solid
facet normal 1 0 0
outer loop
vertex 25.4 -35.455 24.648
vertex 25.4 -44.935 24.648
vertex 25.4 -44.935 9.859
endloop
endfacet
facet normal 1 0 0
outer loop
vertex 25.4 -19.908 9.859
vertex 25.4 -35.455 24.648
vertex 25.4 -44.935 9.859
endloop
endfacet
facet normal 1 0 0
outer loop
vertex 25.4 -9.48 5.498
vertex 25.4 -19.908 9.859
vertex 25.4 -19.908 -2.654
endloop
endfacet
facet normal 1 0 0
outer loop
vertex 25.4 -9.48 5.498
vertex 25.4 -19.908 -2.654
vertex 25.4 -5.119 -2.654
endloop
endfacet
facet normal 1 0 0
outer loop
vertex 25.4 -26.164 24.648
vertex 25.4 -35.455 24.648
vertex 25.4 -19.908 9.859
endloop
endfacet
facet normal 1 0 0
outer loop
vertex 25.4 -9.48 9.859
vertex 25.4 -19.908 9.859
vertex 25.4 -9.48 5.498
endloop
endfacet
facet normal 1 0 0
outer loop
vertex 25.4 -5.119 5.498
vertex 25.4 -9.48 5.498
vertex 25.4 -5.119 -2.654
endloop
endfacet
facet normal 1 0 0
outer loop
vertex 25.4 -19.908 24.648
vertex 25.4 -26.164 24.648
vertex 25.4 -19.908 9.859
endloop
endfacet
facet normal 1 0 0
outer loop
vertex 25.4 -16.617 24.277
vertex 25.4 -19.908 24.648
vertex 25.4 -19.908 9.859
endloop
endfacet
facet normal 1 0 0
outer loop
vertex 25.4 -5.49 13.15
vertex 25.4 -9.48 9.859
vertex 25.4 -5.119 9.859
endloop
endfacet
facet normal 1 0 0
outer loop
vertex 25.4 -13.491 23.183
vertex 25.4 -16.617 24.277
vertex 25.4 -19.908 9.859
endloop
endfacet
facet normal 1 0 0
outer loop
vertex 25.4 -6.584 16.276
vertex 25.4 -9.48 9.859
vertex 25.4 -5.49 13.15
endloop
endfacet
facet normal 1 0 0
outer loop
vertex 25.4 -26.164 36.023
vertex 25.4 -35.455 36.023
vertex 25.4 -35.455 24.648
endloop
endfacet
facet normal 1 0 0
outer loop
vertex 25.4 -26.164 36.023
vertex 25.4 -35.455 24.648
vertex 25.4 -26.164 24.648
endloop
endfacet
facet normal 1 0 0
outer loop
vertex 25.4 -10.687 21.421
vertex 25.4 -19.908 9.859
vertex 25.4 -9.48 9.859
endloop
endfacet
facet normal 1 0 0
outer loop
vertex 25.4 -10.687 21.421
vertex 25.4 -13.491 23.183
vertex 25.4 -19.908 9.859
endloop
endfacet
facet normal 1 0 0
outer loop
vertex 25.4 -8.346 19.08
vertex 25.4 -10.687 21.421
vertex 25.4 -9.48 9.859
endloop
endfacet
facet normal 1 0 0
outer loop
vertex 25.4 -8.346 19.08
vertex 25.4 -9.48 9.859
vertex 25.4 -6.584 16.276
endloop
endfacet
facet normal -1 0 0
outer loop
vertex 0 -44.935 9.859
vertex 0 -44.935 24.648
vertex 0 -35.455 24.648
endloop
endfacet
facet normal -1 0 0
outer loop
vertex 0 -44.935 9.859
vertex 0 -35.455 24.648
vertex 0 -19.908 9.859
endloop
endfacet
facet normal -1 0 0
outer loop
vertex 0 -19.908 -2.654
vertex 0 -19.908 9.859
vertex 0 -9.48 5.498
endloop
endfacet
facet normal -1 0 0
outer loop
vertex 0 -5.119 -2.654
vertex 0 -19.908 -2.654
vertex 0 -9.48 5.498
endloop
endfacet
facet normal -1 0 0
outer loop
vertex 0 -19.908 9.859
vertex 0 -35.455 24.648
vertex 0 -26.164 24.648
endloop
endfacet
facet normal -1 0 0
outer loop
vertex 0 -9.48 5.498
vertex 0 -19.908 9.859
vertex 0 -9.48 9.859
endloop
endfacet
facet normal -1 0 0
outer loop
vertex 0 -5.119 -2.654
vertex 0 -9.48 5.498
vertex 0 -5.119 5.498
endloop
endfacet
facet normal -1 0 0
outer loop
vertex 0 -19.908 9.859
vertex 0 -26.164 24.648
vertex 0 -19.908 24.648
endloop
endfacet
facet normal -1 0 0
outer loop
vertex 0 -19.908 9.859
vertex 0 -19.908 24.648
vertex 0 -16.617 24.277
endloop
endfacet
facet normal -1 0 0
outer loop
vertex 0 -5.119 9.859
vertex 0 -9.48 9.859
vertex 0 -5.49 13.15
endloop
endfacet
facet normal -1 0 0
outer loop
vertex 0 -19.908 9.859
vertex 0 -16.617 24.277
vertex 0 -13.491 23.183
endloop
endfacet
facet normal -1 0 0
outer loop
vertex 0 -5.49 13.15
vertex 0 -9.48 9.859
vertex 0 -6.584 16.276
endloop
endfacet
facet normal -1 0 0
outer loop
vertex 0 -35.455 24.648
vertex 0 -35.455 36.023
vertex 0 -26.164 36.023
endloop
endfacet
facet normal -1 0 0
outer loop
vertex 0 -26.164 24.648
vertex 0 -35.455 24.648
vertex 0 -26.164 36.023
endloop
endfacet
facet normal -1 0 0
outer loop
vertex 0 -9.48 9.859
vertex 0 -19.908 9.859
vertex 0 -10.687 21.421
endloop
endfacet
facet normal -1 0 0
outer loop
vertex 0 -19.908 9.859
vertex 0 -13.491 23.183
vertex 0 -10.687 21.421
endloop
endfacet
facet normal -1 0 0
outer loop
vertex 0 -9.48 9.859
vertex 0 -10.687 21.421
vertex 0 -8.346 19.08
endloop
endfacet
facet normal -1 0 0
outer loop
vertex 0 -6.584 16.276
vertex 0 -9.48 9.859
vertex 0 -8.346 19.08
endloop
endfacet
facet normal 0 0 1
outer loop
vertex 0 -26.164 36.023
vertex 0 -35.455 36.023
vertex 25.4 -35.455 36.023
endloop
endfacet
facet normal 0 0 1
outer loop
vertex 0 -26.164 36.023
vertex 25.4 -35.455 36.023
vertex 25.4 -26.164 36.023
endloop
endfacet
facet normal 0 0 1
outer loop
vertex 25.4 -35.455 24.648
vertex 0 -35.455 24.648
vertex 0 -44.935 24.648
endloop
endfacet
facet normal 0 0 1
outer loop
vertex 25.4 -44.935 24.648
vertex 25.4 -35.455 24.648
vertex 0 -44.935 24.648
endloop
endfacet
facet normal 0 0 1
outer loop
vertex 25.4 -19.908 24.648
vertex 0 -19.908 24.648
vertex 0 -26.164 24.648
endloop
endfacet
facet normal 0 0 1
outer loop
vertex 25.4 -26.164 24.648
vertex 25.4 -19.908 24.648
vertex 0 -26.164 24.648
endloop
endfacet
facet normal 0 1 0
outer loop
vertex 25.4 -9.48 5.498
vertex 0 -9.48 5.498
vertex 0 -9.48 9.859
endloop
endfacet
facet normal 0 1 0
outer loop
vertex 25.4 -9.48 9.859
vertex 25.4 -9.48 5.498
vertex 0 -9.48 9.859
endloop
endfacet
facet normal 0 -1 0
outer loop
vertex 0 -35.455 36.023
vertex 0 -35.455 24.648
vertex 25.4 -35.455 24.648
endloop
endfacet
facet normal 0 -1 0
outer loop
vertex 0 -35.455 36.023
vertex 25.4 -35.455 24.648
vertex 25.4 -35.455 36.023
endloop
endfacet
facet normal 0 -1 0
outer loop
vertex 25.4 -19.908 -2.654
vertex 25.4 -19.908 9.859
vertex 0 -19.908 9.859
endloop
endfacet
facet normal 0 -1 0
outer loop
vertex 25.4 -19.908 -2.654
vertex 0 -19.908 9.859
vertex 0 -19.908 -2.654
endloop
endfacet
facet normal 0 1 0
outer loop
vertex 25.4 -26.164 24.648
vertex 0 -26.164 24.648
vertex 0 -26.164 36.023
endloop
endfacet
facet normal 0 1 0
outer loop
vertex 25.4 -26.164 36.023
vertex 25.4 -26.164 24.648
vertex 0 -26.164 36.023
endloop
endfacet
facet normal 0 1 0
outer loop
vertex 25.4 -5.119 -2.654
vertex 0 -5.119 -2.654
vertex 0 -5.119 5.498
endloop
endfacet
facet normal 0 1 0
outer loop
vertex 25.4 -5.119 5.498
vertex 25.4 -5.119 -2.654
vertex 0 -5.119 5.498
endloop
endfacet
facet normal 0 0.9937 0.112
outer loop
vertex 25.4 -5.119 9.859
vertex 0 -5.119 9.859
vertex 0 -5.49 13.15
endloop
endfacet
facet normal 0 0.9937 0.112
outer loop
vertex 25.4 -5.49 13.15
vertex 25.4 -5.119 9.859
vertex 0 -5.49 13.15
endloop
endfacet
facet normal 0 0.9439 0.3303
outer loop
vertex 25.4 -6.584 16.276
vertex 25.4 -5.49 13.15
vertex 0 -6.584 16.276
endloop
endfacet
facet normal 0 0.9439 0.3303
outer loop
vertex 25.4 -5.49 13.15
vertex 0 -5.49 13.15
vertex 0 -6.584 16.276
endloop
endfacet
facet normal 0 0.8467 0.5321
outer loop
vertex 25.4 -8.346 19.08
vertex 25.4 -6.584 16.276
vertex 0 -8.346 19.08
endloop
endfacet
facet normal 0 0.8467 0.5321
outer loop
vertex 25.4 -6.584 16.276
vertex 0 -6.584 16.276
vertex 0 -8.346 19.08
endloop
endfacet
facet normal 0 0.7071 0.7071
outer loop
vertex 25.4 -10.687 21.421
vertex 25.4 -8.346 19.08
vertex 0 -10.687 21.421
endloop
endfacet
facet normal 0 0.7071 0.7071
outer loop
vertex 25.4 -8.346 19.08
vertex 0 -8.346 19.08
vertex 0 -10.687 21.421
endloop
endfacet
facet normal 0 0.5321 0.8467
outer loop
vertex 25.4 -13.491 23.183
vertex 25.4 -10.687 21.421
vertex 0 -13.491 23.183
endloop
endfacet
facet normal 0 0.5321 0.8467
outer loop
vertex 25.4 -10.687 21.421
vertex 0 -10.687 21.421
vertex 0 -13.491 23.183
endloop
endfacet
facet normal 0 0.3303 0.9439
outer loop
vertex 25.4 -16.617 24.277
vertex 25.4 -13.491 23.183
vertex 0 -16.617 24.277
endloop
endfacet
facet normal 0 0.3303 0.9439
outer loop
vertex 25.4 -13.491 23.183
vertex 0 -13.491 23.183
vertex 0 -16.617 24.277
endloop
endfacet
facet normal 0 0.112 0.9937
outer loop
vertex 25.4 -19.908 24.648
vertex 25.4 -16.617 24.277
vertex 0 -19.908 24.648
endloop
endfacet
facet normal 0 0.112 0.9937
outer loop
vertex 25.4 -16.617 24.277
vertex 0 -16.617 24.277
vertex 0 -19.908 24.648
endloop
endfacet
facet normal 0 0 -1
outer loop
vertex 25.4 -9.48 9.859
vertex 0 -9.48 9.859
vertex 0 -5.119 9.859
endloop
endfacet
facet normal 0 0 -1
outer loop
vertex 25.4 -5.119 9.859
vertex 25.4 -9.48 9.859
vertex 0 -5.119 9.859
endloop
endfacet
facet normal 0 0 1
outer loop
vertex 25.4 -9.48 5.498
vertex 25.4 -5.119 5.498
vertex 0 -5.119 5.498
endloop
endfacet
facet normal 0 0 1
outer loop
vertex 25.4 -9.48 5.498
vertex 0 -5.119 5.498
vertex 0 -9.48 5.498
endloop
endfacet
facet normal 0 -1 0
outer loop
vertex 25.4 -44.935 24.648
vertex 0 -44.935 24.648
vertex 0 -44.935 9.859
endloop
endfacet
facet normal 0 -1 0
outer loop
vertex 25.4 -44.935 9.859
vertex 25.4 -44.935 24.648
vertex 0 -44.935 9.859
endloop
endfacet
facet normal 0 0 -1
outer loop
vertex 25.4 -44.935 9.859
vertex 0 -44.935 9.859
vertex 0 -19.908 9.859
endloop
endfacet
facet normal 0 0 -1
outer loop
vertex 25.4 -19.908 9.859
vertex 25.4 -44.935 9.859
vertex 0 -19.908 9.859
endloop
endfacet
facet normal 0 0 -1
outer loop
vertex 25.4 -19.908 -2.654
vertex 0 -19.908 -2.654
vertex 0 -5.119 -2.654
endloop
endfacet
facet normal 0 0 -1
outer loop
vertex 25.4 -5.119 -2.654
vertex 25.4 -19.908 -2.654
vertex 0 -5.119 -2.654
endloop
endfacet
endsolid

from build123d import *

# Parameters (mm, degrees)
F0_W     = 9.290261
F0_H     = 11.375831
F1_DEPTH = 25.4


with BuildPart() as f1:
    # F0 (on Right) → F1 (new body)
    with BuildSketch(Plane.YZ):
        Polygon((-35.454668, 24.647629), (-44.934526, 24.647629), (-44.934526, 9.859052), (-19.907702, 9.859052), (-19.907702, 24.647629), (-26.164407, 24.647629), align=None)
        with Locations((-30.809537, 30.335544)):
            Rectangle(F0_W, F0_H)
        Polygon((-9.479858, 9.859052), (-19.907702, 9.859052), (-19.907702, -2.65436), (-5.119123, -2.65436), (-5.119123, 5.498318), (-9.479858, 5.498318), align=None)
        with BuildLine():
            Line((-19.907702, 24.647629), (-19.907702, 9.859052))
            Line((-19.907702, 9.859052), (-9.479858, 9.859052))
            Line((-9.479858, 9.859052), (-5.119123, 9.859052))
            ThreePointArc((-5.119123, 9.859052), (-9.450598, 20.316156), (-19.907702, 24.647629))
        make_face()
    extrude(amount=F1_DEPTH)


solid = f1.part
